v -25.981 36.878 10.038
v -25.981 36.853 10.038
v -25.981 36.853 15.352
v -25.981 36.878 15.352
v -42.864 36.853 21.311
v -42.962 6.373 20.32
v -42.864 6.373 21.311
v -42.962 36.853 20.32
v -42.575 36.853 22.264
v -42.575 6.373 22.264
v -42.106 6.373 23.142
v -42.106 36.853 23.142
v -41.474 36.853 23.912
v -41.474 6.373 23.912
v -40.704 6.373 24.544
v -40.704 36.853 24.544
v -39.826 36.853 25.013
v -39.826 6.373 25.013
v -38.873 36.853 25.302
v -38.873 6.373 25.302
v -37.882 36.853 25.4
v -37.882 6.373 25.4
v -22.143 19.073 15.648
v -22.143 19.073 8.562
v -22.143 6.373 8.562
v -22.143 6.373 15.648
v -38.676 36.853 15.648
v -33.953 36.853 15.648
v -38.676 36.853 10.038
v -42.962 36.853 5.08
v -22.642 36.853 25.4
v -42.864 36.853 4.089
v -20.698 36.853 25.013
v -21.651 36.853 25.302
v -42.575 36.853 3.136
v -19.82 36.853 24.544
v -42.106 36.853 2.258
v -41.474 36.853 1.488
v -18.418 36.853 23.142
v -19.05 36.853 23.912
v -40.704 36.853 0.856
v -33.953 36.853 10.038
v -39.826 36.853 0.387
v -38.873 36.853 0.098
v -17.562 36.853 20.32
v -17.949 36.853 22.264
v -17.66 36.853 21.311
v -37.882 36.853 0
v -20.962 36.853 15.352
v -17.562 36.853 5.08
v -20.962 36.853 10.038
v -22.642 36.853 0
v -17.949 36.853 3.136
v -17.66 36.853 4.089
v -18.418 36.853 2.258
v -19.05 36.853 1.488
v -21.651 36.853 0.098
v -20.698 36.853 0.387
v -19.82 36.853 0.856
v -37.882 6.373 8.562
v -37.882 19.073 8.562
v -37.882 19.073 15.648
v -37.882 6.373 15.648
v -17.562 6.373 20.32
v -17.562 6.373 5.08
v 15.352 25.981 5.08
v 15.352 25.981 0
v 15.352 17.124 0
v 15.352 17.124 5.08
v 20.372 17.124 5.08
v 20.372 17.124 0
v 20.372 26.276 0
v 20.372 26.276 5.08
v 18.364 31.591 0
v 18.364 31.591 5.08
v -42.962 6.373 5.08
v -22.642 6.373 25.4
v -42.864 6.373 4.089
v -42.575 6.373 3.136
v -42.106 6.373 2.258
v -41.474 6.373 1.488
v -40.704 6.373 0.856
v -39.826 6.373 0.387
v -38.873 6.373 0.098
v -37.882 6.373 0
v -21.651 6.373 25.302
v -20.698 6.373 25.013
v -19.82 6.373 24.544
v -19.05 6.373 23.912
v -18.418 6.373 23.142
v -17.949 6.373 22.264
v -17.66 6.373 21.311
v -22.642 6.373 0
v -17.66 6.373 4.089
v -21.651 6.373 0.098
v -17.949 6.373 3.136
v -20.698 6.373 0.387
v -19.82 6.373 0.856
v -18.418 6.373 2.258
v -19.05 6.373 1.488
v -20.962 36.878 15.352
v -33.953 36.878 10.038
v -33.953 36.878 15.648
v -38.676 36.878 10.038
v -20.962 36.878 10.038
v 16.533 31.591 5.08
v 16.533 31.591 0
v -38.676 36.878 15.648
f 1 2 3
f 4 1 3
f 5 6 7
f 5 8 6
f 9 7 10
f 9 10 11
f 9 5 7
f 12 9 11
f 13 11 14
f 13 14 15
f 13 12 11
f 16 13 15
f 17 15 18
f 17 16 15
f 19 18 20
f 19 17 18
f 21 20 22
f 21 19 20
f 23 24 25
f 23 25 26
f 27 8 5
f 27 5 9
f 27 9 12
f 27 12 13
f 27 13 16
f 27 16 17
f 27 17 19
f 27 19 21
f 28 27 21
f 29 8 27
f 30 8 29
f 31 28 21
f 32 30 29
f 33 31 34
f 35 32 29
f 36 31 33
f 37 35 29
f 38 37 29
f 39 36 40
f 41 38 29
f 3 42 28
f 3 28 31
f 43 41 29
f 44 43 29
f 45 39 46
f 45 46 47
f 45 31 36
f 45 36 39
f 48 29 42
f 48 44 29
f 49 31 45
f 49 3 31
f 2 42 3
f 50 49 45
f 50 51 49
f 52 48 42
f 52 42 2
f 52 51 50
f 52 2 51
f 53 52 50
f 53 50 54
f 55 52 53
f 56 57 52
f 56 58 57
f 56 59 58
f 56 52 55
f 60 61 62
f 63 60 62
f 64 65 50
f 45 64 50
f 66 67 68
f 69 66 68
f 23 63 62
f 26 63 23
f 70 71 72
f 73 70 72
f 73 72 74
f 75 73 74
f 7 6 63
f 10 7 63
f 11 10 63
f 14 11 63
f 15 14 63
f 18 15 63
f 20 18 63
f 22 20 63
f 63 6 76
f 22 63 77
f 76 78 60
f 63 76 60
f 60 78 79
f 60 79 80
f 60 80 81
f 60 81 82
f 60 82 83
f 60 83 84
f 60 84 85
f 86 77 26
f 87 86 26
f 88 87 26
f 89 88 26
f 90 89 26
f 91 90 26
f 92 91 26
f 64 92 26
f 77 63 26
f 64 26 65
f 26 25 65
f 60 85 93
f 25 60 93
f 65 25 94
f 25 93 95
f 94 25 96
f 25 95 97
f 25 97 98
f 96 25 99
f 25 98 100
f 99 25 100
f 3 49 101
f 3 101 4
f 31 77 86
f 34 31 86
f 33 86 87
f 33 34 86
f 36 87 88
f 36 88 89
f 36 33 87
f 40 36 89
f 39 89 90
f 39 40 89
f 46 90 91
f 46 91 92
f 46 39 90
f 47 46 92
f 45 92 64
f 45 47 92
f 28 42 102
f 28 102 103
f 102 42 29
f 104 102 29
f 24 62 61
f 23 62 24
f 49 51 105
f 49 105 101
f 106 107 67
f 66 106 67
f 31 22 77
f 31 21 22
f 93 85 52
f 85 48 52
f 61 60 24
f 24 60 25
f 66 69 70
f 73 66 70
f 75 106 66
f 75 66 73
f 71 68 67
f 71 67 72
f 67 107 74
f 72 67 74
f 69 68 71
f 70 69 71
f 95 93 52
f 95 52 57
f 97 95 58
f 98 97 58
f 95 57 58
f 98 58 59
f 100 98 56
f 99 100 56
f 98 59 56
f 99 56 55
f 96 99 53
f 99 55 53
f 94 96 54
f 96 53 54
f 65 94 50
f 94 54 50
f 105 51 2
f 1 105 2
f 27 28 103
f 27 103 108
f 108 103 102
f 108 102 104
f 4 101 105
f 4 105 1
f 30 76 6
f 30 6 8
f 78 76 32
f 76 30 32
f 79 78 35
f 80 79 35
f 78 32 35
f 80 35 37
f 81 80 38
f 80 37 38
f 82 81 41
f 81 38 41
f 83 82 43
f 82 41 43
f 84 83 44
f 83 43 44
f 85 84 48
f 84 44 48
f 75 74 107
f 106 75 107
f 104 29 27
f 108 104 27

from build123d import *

# Parameters (mm, degrees)
F0_W     = 25.4
F0_H     = 30.48
F1_DEPTH = 25.4
F2_R     = 5.08
F3_R     = 5.08
F5_DEPTH = 5.08
F6_W     = 15.739095
F6_H     = 7.085757
F7_DEPTH = 12.7
F8_W     = 4.723836
F8_H     = 5.609558
F8_W_2   = 5.01908
F8_H_2   = 5.314318
F9_DEPTH = 0.0254


with BuildPart() as f1:
    # F0 (on Top) → F1 (new body)
    with BuildSketch(Plane.XY):
        with Locations((-30.262085, 21.61251)):
            Rectangle(F0_W, F0_H)
    extrude(amount=F1_DEPTH)

    # F2
    f2_edges = [f1.edges().sort_by_distance(p)[0] for p in [
        (-42.962085, 21.61251, 25.4),
    ]]
    fillet(f2_edges, radius=F2_R)

    # F3
    f3_edges = [f1.edges().sort_by_distance(p)[0] for p in [
        (-42.962085, 21.61251, 0),
        (-17.562085, 21.61251, 0),
        (-17.562085, 21.61251, 25.4),
    ]]
    fillet(f3_edges, radius=F3_R)

    # F6 (on face) → F7 (cut)
    with BuildSketch(Plane.XZ.offset(-6.37251)):
        with Locations((-30.012537, 12.104834)):
            Rectangle(F6_W, F6_H)
    extrude(amount=-F7_DEPTH, mode=Mode.SUBTRACT)

    # F8 (on face) → F9 (join)
    with BuildSketch(Plane(origin=(0, 36.85251, 0), x_dir=(-1, 0, 0), z_dir=(0, 1, 0))):
        with Locations((36.314504, 12.842934)):
            Rectangle(F8_W, F8_H)
        with Locations((23.471568, 12.695314)):
            Rectangle(F8_W_2, F8_H_2)
    extrude(amount=F9_DEPTH)


with BuildPart() as f5:
    # F4 (on Top) → F5 (new body)
    with BuildSketch(Plane.XY):
        Polygon((15.352475, 25.981108), (15.352475, 17.123912), (20.371549, 17.123912), (20.371549, 26.276346), (18.363918, 31.590667), (16.533433, 31.590667), align=None)
    extrude(amount=F5_DEPTH)


solid = Compound([f1.part, f5.part])
